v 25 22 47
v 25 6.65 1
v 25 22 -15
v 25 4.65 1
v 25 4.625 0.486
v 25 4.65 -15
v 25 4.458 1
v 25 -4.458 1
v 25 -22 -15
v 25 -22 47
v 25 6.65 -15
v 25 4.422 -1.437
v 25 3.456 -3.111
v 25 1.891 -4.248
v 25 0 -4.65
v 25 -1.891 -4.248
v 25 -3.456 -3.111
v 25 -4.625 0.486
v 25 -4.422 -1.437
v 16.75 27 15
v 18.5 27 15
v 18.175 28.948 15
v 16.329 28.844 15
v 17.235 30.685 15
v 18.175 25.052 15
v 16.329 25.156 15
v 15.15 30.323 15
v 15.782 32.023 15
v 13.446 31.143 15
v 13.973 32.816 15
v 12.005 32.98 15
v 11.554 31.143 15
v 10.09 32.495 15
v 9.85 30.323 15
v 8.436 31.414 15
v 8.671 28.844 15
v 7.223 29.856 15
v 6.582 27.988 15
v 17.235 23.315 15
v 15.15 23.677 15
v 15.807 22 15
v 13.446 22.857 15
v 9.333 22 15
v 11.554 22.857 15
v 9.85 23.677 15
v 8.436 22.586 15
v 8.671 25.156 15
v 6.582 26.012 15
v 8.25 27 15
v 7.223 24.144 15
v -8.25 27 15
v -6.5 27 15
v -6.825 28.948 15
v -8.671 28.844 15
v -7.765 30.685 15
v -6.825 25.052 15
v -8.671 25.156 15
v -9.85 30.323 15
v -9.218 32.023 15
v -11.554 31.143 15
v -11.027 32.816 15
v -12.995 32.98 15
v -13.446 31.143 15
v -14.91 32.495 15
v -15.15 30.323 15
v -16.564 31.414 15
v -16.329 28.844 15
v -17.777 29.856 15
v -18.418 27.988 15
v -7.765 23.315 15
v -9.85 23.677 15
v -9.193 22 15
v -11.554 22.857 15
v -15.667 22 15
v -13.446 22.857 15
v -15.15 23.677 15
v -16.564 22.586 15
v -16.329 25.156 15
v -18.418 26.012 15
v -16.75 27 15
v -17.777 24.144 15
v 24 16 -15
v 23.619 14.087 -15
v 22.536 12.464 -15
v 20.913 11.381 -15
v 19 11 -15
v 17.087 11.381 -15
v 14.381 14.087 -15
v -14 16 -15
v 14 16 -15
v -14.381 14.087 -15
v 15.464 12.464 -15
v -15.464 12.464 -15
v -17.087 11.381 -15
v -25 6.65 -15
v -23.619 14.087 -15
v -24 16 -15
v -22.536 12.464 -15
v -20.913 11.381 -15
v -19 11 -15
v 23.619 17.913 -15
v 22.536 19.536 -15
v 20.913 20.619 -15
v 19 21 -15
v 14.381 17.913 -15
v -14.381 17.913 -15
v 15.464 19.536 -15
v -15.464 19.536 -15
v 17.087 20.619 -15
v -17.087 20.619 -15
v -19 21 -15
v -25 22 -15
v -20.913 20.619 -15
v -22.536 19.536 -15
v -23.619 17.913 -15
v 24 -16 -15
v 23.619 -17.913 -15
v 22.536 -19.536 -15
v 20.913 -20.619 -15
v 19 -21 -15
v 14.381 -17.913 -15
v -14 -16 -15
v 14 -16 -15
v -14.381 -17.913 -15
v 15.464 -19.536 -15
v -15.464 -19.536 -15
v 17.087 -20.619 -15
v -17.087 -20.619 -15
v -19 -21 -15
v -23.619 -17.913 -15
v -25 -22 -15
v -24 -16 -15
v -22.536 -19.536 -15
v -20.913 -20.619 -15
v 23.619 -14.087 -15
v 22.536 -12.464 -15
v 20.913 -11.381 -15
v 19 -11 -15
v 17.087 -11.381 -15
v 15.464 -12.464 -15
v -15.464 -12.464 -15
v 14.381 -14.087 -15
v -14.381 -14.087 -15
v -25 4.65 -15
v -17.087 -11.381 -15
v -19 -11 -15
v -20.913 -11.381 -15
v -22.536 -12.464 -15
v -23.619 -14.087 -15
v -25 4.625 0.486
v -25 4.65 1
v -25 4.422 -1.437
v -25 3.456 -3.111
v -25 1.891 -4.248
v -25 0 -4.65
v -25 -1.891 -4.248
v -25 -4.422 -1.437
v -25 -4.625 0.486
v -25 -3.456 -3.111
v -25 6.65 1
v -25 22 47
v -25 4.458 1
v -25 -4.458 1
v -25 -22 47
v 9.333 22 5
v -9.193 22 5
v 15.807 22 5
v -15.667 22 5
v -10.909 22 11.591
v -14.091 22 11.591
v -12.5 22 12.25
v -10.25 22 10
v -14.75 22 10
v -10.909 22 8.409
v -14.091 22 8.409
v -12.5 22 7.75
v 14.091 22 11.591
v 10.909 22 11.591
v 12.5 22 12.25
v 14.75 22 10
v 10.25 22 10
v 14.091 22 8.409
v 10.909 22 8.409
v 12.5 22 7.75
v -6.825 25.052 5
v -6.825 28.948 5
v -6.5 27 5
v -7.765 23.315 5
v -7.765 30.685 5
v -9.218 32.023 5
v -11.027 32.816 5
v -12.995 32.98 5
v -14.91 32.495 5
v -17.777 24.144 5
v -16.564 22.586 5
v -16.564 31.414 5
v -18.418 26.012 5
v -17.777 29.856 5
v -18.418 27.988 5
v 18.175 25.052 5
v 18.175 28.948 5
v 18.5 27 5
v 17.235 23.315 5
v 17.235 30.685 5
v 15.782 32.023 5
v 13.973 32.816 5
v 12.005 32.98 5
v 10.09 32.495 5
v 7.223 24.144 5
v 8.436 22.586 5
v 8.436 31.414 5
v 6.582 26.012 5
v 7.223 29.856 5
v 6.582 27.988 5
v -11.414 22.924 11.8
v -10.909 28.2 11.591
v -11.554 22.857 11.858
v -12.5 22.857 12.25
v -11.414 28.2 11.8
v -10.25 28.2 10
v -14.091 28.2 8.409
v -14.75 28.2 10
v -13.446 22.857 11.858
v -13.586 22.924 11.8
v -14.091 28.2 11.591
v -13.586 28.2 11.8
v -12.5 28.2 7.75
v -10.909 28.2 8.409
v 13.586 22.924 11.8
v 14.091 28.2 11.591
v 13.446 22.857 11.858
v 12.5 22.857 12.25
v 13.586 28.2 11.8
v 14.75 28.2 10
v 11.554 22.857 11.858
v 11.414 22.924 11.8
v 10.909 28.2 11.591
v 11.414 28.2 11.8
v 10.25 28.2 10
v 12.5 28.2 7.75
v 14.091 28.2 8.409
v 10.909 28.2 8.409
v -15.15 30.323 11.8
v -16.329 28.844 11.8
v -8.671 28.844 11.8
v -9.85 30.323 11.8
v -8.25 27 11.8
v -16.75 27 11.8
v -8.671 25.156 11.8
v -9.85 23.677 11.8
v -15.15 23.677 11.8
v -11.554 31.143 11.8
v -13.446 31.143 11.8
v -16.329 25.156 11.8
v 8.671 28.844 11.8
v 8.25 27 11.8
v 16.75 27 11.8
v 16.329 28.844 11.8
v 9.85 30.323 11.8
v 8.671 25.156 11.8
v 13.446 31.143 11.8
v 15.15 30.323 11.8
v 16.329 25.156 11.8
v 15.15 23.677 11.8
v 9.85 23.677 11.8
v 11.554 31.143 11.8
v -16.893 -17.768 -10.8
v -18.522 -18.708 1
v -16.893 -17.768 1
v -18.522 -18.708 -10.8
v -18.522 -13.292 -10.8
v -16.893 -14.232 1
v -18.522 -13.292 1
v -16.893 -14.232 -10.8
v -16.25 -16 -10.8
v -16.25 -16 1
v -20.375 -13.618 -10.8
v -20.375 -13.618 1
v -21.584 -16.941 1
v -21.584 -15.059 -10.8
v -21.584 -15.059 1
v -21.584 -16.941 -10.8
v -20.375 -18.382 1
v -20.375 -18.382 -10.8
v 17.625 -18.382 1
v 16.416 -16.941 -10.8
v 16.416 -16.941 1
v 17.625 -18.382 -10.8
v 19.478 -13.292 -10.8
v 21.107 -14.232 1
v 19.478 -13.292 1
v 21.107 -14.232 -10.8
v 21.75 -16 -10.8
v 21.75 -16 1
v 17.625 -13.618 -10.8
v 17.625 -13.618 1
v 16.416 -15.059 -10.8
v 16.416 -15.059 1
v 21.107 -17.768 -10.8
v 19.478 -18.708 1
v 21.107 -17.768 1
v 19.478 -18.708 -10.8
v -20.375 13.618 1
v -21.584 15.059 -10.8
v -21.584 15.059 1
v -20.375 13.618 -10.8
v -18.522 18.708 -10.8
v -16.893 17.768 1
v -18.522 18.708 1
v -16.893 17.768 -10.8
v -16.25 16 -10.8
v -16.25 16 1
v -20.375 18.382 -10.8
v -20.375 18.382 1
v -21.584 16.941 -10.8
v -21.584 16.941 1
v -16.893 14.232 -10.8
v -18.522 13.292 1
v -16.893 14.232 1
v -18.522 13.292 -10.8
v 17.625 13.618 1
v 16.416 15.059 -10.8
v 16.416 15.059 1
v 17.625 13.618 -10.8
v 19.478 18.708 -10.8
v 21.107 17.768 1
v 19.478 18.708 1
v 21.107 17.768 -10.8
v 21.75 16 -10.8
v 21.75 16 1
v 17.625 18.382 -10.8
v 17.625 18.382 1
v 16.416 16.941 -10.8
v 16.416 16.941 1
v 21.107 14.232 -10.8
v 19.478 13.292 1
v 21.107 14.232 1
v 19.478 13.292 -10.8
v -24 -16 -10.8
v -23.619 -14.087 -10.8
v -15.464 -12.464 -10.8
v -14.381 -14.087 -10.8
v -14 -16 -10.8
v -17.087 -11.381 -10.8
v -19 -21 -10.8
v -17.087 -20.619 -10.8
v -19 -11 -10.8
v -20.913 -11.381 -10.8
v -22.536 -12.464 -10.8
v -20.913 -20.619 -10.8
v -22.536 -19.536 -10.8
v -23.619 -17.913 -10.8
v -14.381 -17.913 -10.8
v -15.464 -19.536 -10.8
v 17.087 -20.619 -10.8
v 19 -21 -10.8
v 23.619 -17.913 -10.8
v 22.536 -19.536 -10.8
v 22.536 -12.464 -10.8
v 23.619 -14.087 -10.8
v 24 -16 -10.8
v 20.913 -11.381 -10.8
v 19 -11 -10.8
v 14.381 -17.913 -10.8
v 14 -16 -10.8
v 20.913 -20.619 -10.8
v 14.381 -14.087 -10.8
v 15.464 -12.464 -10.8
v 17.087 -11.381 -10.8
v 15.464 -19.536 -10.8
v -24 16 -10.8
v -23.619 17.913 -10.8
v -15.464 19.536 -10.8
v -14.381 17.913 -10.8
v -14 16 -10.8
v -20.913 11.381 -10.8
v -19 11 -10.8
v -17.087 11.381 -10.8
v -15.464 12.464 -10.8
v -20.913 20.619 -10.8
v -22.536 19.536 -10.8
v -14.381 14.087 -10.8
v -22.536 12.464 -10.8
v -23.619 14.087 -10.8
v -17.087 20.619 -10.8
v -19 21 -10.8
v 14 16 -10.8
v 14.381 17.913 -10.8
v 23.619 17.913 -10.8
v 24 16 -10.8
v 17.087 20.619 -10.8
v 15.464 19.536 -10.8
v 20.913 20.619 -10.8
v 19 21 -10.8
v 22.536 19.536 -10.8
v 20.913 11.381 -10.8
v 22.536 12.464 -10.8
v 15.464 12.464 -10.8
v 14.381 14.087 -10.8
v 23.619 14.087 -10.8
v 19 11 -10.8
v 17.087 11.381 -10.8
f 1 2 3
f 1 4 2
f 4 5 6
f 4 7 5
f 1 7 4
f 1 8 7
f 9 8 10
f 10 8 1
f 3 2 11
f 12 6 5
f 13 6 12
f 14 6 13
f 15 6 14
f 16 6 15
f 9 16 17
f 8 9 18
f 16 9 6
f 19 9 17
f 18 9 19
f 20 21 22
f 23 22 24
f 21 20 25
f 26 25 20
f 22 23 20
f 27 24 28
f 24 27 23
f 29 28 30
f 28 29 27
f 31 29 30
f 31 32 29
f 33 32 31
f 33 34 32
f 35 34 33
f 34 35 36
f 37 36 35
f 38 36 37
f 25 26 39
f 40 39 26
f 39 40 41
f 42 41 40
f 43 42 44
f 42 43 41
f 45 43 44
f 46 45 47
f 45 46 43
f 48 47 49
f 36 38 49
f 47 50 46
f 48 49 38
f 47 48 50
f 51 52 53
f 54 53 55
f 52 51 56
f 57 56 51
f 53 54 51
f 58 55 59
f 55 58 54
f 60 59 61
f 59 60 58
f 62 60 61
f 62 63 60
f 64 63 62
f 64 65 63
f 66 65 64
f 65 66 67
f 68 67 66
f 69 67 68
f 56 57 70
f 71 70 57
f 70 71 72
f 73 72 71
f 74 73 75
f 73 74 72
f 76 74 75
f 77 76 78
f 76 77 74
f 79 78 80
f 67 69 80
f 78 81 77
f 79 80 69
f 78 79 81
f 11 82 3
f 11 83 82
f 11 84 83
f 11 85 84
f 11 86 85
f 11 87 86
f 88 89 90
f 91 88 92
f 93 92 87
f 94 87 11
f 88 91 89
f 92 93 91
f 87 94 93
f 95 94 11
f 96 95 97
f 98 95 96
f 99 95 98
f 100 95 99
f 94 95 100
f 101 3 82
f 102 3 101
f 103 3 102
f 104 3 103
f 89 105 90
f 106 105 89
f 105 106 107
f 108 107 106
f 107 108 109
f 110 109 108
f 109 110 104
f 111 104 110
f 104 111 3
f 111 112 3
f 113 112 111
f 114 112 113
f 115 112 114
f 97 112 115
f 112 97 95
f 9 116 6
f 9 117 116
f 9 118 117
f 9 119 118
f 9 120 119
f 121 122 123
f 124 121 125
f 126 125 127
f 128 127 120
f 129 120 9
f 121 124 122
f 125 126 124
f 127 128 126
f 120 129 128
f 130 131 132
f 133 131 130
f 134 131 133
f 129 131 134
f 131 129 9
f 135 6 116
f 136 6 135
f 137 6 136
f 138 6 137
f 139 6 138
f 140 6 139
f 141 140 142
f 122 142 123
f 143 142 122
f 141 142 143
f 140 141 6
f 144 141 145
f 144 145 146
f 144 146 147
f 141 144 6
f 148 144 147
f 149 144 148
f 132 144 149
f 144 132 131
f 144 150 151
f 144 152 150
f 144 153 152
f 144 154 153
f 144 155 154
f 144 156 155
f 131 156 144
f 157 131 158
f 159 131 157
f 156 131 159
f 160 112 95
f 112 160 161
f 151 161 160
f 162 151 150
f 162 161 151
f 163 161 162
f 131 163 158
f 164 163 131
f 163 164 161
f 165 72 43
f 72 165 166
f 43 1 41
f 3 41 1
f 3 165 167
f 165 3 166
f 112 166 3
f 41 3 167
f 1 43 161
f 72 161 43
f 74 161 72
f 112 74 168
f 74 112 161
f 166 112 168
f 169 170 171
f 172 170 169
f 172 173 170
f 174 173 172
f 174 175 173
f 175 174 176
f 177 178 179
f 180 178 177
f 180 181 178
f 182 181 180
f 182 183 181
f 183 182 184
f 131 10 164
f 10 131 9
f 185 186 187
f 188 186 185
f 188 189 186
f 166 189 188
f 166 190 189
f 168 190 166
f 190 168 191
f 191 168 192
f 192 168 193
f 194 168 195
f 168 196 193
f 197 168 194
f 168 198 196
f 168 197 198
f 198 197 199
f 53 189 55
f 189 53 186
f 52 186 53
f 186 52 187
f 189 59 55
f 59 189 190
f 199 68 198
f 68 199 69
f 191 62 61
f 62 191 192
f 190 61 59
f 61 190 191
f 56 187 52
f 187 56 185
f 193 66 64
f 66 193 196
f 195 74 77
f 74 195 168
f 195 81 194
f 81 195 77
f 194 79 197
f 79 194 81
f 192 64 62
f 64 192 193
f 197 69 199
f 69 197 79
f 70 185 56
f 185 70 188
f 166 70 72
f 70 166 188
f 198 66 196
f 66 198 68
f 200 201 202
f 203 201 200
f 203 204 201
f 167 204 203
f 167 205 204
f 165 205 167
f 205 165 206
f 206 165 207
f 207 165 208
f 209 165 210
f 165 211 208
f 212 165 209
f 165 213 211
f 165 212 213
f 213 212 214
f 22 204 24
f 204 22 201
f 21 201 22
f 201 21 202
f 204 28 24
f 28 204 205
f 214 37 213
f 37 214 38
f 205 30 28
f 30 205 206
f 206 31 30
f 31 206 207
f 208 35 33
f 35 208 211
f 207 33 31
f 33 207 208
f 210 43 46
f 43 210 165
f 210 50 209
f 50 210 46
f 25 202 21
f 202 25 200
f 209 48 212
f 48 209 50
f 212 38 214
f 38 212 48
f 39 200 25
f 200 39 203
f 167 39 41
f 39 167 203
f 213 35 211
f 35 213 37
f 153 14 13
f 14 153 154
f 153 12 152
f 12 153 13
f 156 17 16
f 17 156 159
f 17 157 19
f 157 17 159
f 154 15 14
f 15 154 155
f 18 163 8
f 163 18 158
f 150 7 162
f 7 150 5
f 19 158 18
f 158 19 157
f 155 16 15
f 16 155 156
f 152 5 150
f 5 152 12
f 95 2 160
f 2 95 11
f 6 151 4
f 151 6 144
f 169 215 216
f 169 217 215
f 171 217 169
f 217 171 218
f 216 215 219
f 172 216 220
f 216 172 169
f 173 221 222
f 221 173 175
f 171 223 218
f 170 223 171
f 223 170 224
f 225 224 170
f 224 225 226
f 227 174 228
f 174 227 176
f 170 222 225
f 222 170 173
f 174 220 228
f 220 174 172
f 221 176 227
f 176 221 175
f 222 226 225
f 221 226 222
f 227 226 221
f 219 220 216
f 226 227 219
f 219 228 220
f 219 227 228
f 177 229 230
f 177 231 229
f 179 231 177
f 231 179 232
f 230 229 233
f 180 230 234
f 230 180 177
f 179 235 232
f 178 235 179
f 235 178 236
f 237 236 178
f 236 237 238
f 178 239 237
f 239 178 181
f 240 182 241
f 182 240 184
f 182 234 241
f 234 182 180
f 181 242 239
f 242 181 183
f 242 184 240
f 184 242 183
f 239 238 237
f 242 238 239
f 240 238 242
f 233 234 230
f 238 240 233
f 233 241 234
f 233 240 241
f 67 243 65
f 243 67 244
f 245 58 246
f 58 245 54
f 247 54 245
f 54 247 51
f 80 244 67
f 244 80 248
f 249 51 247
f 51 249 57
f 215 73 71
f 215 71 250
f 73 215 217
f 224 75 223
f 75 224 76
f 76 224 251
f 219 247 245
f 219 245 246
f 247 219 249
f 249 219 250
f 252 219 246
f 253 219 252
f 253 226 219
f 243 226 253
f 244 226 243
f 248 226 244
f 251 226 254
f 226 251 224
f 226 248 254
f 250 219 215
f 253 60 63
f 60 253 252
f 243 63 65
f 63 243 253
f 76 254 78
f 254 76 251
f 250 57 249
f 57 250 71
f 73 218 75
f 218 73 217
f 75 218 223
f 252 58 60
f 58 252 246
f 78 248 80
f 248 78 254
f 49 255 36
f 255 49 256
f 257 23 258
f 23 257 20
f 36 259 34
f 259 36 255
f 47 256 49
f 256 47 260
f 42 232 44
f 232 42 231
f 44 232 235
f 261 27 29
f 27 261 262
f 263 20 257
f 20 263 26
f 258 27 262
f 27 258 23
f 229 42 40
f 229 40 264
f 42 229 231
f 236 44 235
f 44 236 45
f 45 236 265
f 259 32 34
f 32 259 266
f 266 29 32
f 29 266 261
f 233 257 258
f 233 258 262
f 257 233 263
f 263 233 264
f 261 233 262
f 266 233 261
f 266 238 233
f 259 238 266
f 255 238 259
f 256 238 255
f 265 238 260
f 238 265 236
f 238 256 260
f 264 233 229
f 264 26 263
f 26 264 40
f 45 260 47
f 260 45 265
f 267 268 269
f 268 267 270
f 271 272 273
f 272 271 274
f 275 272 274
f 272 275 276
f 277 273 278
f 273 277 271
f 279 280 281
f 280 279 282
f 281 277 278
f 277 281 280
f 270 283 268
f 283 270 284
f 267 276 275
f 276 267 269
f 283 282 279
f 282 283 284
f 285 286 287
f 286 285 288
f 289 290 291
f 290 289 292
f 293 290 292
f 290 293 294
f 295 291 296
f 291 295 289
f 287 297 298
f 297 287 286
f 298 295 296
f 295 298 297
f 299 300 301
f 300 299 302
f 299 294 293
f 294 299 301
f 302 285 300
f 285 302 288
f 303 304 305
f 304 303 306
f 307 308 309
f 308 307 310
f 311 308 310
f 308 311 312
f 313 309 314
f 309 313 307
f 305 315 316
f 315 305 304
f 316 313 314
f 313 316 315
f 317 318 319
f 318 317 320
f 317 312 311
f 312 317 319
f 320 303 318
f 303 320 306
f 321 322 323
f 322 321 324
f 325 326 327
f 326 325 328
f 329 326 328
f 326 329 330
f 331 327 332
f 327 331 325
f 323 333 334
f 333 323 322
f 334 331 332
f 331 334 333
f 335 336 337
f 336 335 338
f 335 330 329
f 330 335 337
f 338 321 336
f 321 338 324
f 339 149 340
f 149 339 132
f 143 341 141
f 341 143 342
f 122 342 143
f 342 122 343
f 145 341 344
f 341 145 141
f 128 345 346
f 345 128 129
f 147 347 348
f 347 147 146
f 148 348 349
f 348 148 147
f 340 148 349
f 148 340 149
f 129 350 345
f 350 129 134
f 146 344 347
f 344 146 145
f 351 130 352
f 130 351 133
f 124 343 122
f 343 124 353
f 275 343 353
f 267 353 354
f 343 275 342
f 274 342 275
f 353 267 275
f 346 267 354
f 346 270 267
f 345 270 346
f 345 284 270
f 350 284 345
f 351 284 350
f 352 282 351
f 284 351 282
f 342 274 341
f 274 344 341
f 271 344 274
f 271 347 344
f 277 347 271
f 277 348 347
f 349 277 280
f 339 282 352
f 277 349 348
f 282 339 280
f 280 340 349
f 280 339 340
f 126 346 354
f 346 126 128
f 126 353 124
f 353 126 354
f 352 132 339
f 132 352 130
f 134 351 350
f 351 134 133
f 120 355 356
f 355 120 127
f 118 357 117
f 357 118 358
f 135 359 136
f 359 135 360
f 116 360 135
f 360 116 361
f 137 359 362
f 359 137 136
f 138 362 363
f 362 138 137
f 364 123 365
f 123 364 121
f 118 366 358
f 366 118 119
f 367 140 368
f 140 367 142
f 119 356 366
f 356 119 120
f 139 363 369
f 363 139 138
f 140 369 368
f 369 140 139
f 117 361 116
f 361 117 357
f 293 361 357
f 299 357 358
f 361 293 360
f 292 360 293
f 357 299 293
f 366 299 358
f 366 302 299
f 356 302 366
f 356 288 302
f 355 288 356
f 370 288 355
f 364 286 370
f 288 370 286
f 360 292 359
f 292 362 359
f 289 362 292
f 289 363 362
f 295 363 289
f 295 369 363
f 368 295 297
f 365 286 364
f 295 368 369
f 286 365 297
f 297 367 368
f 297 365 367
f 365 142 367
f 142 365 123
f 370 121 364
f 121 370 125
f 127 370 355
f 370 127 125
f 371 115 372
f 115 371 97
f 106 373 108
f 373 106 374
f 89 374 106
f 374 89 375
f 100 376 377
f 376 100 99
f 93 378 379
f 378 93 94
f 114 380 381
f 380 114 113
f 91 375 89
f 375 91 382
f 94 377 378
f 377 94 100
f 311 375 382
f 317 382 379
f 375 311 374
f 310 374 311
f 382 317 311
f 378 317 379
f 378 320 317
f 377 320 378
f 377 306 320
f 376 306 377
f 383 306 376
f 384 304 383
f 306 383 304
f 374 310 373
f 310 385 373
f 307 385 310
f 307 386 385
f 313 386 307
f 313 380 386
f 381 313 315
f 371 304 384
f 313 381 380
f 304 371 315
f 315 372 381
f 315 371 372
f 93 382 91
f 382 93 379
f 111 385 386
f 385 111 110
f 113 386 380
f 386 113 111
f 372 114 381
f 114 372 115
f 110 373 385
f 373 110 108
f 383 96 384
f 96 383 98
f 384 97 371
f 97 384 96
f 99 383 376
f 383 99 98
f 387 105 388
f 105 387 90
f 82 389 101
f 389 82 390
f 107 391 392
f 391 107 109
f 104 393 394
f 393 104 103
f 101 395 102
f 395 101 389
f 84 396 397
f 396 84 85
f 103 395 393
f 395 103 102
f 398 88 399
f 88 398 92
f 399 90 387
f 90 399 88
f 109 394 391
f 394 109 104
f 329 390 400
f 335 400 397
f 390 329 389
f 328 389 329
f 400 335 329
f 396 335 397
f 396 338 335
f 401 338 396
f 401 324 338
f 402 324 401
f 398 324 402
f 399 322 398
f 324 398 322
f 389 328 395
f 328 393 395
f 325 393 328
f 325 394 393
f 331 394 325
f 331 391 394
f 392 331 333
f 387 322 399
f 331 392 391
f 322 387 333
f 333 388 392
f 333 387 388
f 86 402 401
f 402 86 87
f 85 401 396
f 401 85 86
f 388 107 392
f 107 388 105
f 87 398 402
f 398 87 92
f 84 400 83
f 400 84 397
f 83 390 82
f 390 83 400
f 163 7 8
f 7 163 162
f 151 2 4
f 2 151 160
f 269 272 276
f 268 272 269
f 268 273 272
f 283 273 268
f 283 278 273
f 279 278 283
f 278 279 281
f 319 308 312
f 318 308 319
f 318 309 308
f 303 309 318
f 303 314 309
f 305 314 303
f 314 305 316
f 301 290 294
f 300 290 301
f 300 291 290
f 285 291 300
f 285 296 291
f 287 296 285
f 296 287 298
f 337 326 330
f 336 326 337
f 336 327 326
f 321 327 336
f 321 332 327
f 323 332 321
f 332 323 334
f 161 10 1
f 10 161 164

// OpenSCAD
// Parameters
shaft_diameter_mm = 9.0; //[4.5:18.0:0.1]
block_length_mm = 50.0; //[25.0:100.0:0.5]
block_width_mm = 44.0; //[22.0:88.0:0.5]
block_height_mm = 30.0; //[15.0:60.0:0.5]
bore_type = 0; //[0:1:1]
shaft_clearance_mm = 0.3; //[0.05:0.8:0.05]
bearing_press_fit_mm = -0.1; //[-0.3:0.2:0.05]
bearing_bore_extra_mm = 6.0; //[3.0:12.0:0.5]
bore_diameter_mm = 15.0; //[9.5:30.0:0.1]
mount_hole_count = 4; //[2:4:1]
mount_hole_diameter_mm = 5.5; //[3.0:10.0:0.1]
mount_hole_counterbore_diameter_mm = 10.0; //[6.0:18.0:0.1]
mount_hole_counterbore_depth_mm = 4.0; //[1.5:10.0:0.1]
mount_hole_edge_margin_mm = 6.0; //[3.0:12.0:0.5]
mount_hole_spacing_x_mm = 38.0; //[20.0:80.0:0.5]
mount_hole_spacing_y_mm = 32.0; //[16.0:70.0:0.5]
clamp_style = 0; //[0:0:1]
clamp_slot_width_mm = 2.0; //[1.0:4.0:0.1]
clamp_screw_count = 2; //[1:3:1]
clamp_screw_diameter_mm = 4.5; //[3.0:8.0:0.1]
clamp_screw_boss_diameter_mm = 12.0; //[8.0:20.0:0.5]
clamp_screw_boss_height_mm = 10.0; //[6.0:20.0:0.5]
clamp_screw_head_counterbore_diameter_mm = 8.5; //[6.0:14.0:0.1]
clamp_screw_head_counterbore_depth_mm = 3.0; //[1.0:8.0:0.1]
overlap_mm = 1.0; //[0.5:2.0:0.1]
eps_mm = 0.2; //[0.05:0.5:0.05]

// SBR Bearing Block Assembly
module sbr_bearing_block_assembly() {
  color("Silver") {
    difference() {
      union() {
        // Main block body
        translate([0, 0, 0])
          cube([block_length_mm, block_width_mm, block_height_mm], center=true);
        
        // Bearing retention features
        translate([0, 0, block_height_mm/2 - (block_height_mm*0.25)/2])
          cube([block_length_mm, block_width_mm, block_height_mm*0.25], center=true);
        
        // Clamp bosses
        translate([-(block_length_mm/4), block_width_mm/2 + clamp_screw_boss_diameter_mm/2 - overlap_mm, block_height_mm/2 - clamp_screw_boss_height_mm/2])
          cylinder(r=clamp_screw_boss_diameter_mm/2, h=clamp_screw_boss_height_mm, center=true);
        translate([(block_length_mm/4), block_width_mm/2 + clamp_screw_boss_diameter_mm/2 - overlap_mm, block_height_mm/2 - clamp_screw_boss_height_mm/2])
          cylinder(r=clamp_screw_boss_diameter_mm/2, h=clamp_screw_boss_height_mm, center=true);
      }
      
      // Shaft bore or bearing bore
      translate([0, 0, 0])
        rotate([0, 90, 0])
        cylinder(r=((bore_type==0) ? (shaft_diameter_mm + shaft_clearance_mm)/2 : (bore_diameter_mm + bearing_press_fit_mm)/2), h=block_length_mm + 2*eps_mm, center=true);
      
      // Split clamp slot and clamp screw bosses
      translate([0, ((bore_type==0) ? (shaft_diameter_mm + shaft_clearance_mm)/2 : (bore_diameter_mm + bearing_press_fit_mm)/2) + clamp_slot_width_mm/2, 0])
        cube([block_length_mm + 2*eps_mm, clamp_slot_width_mm, block_height_mm + 2*eps_mm], center=true);
      
      // Clamp screw holes
      translate([-(block_length_mm/4), 0, block_height_mm/2 - clamp_screw_boss_height_mm/2])
        rotate([90, 0, 0])
        cylinder(r=clamp_screw_diameter_mm/2, h=block_width_mm + clamp_screw_boss_diameter_mm + 2*eps_mm, center=true);
      translate([(block_length_mm/4), 0, block_height_mm/2 - clamp_screw_boss_height_mm/2])
        rotate([90, 0, 0])
        cylinder(r=clamp_screw_diameter_mm/2, h=block_width_mm + clamp_screw_boss_diameter_mm + 2*eps_mm, center=true);
      
      // Clamp screw head counterbores
      translate([-(block_length_mm/4), block_width_mm/2 + clamp_screw_boss_diameter_mm/2 - overlap_mm, block_height_mm/2 - (clamp_screw_head_counterbore_depth_mm + eps_mm)/2])
        cylinder(r=clamp_screw_head_counterbore_diameter_mm/2, h=clamp_screw_head_counterbore_depth_mm + eps_mm, center=true);
      translate([(block_length_mm/4), block_width_mm/2 + clamp_screw_boss_diameter_mm/2 - overlap_mm, block_height_mm/2 - (clamp_screw_head_counterbore_depth_mm + eps_mm)/2])
        cylinder(r=clamp_screw_head_counterbore_diameter_mm/2, h=clamp_screw_head_counterbore_depth_mm + eps_mm, center=true);
      
      // Mounting holes
      translate([-(block_length_mm/2 - mount_hole_edge_margin_mm), -(block_width_mm/2 - mount_hole_edge_margin_mm), 0])
        cylinder(r=mount_hole_diameter_mm/2, h=block_height_mm + 2*eps_mm, center=true);
      translate([(block_length_mm/2 - mount_hole_edge_margin_mm), -(block_width_mm/2 - mount_hole_edge_margin_mm), 0])
        cylinder(r=mount_hole_diameter_mm/2, h=block_height_mm + 2*eps_mm, center=true);
      translate([-(block_length_mm/2 - mount_hole_edge_margin_mm), (block_width_mm/2 - mount_hole_edge_margin_mm), 0])
        cylinder(r=mount_hole_diameter_mm/2, h=block_height_mm + 2*eps_mm, center=true);
      translate([(block_length_mm/2 - mount_hole_edge_margin_mm), (block_width_mm/2 - mount_hole_edge_margin_mm), 0])
        cylinder(r=mount_hole_diameter_mm/2, h=block_height_mm + 2*eps_mm, center=true);
      
      // Mounting hole counterbores
      translate([-(block_length_mm/2 - mount_hole_edge_margin_mm), -(block_width_mm/2 - mount_hole_edge_margin_mm), -block_height_mm/2 + (mount_hole_counterbore_depth_mm + eps_mm)/2])
        cylinder(r=mount_hole_counterbore_diameter_mm/2, h=mount_hole_counterbore_depth_mm + eps_mm, center=true);
      translate([(block_length_mm/2 - mount_hole_edge_margin_mm), -(block_width_mm/2 - mount_hole_edge_margin_mm), -block_height_mm/2 + (mount_hole_counterbore_depth_mm + eps_mm)/2])
        cylinder(r=mount_hole_counterbore_diameter_mm/2, h=mount_hole_counterbore_depth_mm + eps_mm, center=true);
      translate([-(block_length_mm/2 - mount_hole_edge_margin_mm), (block_width_mm/2 - mount_hole_edge_margin_mm), -block_height_mm/2 + (mount_hole_counterbore_depth_mm + eps_mm)/2])
        cylinder(r=mount_hole_counterbore_diameter_mm/2, h=mount_hole_counterbore_depth_mm + eps_mm, center=true);
      translate([(block_length_mm/2 - mount_hole_edge_margin_mm), (block_width_mm/2 - mount_hole_edge_margin_mm), -block_height_mm/2 + (mount_hole_counterbore_depth_mm + eps_mm)/2])
        cylinder(r=mount_hole_counterbore_diameter_mm/2, h=mount_hole_counterbore_depth_mm + eps_mm, center=true);
    }
  }
}

// SCS Bearing Block
module scs_bearing_block() {
  color("DimGray") {
    cube([block_length_mm, block_width_mm, block_height_mm], center=true);
  }
}

// SBR Bearing Block
module sbr_bearing_block() {
  color("Black") {
    cube([block_length_mm, block_width_mm, block_height_mm], center=true);
  }
}

// SCS Bearing Block Hole Positions
module scs_bearing_block_hole_positions() {
  color("Silver") {
    translate([0, 0, -block_height_mm/2 + eps_mm/2])
      cube([mount_hole_spacing_x_mm, mount_hole_spacing_y_mm, eps_mm], center=true);
  }
}

// Assembly
module assembly() {
  sbr_bearing_block_assembly();
  translate([0, 0, block_height_mm/2 + 1])
    scs_bearing_block();
  translate([0, 0, block_height_mm + 2])
    sbr_bearing_block();
  translate([0, 0, block_height_mm + 3])
    scs_bearing_block_hole_positions();
}

assembly();
